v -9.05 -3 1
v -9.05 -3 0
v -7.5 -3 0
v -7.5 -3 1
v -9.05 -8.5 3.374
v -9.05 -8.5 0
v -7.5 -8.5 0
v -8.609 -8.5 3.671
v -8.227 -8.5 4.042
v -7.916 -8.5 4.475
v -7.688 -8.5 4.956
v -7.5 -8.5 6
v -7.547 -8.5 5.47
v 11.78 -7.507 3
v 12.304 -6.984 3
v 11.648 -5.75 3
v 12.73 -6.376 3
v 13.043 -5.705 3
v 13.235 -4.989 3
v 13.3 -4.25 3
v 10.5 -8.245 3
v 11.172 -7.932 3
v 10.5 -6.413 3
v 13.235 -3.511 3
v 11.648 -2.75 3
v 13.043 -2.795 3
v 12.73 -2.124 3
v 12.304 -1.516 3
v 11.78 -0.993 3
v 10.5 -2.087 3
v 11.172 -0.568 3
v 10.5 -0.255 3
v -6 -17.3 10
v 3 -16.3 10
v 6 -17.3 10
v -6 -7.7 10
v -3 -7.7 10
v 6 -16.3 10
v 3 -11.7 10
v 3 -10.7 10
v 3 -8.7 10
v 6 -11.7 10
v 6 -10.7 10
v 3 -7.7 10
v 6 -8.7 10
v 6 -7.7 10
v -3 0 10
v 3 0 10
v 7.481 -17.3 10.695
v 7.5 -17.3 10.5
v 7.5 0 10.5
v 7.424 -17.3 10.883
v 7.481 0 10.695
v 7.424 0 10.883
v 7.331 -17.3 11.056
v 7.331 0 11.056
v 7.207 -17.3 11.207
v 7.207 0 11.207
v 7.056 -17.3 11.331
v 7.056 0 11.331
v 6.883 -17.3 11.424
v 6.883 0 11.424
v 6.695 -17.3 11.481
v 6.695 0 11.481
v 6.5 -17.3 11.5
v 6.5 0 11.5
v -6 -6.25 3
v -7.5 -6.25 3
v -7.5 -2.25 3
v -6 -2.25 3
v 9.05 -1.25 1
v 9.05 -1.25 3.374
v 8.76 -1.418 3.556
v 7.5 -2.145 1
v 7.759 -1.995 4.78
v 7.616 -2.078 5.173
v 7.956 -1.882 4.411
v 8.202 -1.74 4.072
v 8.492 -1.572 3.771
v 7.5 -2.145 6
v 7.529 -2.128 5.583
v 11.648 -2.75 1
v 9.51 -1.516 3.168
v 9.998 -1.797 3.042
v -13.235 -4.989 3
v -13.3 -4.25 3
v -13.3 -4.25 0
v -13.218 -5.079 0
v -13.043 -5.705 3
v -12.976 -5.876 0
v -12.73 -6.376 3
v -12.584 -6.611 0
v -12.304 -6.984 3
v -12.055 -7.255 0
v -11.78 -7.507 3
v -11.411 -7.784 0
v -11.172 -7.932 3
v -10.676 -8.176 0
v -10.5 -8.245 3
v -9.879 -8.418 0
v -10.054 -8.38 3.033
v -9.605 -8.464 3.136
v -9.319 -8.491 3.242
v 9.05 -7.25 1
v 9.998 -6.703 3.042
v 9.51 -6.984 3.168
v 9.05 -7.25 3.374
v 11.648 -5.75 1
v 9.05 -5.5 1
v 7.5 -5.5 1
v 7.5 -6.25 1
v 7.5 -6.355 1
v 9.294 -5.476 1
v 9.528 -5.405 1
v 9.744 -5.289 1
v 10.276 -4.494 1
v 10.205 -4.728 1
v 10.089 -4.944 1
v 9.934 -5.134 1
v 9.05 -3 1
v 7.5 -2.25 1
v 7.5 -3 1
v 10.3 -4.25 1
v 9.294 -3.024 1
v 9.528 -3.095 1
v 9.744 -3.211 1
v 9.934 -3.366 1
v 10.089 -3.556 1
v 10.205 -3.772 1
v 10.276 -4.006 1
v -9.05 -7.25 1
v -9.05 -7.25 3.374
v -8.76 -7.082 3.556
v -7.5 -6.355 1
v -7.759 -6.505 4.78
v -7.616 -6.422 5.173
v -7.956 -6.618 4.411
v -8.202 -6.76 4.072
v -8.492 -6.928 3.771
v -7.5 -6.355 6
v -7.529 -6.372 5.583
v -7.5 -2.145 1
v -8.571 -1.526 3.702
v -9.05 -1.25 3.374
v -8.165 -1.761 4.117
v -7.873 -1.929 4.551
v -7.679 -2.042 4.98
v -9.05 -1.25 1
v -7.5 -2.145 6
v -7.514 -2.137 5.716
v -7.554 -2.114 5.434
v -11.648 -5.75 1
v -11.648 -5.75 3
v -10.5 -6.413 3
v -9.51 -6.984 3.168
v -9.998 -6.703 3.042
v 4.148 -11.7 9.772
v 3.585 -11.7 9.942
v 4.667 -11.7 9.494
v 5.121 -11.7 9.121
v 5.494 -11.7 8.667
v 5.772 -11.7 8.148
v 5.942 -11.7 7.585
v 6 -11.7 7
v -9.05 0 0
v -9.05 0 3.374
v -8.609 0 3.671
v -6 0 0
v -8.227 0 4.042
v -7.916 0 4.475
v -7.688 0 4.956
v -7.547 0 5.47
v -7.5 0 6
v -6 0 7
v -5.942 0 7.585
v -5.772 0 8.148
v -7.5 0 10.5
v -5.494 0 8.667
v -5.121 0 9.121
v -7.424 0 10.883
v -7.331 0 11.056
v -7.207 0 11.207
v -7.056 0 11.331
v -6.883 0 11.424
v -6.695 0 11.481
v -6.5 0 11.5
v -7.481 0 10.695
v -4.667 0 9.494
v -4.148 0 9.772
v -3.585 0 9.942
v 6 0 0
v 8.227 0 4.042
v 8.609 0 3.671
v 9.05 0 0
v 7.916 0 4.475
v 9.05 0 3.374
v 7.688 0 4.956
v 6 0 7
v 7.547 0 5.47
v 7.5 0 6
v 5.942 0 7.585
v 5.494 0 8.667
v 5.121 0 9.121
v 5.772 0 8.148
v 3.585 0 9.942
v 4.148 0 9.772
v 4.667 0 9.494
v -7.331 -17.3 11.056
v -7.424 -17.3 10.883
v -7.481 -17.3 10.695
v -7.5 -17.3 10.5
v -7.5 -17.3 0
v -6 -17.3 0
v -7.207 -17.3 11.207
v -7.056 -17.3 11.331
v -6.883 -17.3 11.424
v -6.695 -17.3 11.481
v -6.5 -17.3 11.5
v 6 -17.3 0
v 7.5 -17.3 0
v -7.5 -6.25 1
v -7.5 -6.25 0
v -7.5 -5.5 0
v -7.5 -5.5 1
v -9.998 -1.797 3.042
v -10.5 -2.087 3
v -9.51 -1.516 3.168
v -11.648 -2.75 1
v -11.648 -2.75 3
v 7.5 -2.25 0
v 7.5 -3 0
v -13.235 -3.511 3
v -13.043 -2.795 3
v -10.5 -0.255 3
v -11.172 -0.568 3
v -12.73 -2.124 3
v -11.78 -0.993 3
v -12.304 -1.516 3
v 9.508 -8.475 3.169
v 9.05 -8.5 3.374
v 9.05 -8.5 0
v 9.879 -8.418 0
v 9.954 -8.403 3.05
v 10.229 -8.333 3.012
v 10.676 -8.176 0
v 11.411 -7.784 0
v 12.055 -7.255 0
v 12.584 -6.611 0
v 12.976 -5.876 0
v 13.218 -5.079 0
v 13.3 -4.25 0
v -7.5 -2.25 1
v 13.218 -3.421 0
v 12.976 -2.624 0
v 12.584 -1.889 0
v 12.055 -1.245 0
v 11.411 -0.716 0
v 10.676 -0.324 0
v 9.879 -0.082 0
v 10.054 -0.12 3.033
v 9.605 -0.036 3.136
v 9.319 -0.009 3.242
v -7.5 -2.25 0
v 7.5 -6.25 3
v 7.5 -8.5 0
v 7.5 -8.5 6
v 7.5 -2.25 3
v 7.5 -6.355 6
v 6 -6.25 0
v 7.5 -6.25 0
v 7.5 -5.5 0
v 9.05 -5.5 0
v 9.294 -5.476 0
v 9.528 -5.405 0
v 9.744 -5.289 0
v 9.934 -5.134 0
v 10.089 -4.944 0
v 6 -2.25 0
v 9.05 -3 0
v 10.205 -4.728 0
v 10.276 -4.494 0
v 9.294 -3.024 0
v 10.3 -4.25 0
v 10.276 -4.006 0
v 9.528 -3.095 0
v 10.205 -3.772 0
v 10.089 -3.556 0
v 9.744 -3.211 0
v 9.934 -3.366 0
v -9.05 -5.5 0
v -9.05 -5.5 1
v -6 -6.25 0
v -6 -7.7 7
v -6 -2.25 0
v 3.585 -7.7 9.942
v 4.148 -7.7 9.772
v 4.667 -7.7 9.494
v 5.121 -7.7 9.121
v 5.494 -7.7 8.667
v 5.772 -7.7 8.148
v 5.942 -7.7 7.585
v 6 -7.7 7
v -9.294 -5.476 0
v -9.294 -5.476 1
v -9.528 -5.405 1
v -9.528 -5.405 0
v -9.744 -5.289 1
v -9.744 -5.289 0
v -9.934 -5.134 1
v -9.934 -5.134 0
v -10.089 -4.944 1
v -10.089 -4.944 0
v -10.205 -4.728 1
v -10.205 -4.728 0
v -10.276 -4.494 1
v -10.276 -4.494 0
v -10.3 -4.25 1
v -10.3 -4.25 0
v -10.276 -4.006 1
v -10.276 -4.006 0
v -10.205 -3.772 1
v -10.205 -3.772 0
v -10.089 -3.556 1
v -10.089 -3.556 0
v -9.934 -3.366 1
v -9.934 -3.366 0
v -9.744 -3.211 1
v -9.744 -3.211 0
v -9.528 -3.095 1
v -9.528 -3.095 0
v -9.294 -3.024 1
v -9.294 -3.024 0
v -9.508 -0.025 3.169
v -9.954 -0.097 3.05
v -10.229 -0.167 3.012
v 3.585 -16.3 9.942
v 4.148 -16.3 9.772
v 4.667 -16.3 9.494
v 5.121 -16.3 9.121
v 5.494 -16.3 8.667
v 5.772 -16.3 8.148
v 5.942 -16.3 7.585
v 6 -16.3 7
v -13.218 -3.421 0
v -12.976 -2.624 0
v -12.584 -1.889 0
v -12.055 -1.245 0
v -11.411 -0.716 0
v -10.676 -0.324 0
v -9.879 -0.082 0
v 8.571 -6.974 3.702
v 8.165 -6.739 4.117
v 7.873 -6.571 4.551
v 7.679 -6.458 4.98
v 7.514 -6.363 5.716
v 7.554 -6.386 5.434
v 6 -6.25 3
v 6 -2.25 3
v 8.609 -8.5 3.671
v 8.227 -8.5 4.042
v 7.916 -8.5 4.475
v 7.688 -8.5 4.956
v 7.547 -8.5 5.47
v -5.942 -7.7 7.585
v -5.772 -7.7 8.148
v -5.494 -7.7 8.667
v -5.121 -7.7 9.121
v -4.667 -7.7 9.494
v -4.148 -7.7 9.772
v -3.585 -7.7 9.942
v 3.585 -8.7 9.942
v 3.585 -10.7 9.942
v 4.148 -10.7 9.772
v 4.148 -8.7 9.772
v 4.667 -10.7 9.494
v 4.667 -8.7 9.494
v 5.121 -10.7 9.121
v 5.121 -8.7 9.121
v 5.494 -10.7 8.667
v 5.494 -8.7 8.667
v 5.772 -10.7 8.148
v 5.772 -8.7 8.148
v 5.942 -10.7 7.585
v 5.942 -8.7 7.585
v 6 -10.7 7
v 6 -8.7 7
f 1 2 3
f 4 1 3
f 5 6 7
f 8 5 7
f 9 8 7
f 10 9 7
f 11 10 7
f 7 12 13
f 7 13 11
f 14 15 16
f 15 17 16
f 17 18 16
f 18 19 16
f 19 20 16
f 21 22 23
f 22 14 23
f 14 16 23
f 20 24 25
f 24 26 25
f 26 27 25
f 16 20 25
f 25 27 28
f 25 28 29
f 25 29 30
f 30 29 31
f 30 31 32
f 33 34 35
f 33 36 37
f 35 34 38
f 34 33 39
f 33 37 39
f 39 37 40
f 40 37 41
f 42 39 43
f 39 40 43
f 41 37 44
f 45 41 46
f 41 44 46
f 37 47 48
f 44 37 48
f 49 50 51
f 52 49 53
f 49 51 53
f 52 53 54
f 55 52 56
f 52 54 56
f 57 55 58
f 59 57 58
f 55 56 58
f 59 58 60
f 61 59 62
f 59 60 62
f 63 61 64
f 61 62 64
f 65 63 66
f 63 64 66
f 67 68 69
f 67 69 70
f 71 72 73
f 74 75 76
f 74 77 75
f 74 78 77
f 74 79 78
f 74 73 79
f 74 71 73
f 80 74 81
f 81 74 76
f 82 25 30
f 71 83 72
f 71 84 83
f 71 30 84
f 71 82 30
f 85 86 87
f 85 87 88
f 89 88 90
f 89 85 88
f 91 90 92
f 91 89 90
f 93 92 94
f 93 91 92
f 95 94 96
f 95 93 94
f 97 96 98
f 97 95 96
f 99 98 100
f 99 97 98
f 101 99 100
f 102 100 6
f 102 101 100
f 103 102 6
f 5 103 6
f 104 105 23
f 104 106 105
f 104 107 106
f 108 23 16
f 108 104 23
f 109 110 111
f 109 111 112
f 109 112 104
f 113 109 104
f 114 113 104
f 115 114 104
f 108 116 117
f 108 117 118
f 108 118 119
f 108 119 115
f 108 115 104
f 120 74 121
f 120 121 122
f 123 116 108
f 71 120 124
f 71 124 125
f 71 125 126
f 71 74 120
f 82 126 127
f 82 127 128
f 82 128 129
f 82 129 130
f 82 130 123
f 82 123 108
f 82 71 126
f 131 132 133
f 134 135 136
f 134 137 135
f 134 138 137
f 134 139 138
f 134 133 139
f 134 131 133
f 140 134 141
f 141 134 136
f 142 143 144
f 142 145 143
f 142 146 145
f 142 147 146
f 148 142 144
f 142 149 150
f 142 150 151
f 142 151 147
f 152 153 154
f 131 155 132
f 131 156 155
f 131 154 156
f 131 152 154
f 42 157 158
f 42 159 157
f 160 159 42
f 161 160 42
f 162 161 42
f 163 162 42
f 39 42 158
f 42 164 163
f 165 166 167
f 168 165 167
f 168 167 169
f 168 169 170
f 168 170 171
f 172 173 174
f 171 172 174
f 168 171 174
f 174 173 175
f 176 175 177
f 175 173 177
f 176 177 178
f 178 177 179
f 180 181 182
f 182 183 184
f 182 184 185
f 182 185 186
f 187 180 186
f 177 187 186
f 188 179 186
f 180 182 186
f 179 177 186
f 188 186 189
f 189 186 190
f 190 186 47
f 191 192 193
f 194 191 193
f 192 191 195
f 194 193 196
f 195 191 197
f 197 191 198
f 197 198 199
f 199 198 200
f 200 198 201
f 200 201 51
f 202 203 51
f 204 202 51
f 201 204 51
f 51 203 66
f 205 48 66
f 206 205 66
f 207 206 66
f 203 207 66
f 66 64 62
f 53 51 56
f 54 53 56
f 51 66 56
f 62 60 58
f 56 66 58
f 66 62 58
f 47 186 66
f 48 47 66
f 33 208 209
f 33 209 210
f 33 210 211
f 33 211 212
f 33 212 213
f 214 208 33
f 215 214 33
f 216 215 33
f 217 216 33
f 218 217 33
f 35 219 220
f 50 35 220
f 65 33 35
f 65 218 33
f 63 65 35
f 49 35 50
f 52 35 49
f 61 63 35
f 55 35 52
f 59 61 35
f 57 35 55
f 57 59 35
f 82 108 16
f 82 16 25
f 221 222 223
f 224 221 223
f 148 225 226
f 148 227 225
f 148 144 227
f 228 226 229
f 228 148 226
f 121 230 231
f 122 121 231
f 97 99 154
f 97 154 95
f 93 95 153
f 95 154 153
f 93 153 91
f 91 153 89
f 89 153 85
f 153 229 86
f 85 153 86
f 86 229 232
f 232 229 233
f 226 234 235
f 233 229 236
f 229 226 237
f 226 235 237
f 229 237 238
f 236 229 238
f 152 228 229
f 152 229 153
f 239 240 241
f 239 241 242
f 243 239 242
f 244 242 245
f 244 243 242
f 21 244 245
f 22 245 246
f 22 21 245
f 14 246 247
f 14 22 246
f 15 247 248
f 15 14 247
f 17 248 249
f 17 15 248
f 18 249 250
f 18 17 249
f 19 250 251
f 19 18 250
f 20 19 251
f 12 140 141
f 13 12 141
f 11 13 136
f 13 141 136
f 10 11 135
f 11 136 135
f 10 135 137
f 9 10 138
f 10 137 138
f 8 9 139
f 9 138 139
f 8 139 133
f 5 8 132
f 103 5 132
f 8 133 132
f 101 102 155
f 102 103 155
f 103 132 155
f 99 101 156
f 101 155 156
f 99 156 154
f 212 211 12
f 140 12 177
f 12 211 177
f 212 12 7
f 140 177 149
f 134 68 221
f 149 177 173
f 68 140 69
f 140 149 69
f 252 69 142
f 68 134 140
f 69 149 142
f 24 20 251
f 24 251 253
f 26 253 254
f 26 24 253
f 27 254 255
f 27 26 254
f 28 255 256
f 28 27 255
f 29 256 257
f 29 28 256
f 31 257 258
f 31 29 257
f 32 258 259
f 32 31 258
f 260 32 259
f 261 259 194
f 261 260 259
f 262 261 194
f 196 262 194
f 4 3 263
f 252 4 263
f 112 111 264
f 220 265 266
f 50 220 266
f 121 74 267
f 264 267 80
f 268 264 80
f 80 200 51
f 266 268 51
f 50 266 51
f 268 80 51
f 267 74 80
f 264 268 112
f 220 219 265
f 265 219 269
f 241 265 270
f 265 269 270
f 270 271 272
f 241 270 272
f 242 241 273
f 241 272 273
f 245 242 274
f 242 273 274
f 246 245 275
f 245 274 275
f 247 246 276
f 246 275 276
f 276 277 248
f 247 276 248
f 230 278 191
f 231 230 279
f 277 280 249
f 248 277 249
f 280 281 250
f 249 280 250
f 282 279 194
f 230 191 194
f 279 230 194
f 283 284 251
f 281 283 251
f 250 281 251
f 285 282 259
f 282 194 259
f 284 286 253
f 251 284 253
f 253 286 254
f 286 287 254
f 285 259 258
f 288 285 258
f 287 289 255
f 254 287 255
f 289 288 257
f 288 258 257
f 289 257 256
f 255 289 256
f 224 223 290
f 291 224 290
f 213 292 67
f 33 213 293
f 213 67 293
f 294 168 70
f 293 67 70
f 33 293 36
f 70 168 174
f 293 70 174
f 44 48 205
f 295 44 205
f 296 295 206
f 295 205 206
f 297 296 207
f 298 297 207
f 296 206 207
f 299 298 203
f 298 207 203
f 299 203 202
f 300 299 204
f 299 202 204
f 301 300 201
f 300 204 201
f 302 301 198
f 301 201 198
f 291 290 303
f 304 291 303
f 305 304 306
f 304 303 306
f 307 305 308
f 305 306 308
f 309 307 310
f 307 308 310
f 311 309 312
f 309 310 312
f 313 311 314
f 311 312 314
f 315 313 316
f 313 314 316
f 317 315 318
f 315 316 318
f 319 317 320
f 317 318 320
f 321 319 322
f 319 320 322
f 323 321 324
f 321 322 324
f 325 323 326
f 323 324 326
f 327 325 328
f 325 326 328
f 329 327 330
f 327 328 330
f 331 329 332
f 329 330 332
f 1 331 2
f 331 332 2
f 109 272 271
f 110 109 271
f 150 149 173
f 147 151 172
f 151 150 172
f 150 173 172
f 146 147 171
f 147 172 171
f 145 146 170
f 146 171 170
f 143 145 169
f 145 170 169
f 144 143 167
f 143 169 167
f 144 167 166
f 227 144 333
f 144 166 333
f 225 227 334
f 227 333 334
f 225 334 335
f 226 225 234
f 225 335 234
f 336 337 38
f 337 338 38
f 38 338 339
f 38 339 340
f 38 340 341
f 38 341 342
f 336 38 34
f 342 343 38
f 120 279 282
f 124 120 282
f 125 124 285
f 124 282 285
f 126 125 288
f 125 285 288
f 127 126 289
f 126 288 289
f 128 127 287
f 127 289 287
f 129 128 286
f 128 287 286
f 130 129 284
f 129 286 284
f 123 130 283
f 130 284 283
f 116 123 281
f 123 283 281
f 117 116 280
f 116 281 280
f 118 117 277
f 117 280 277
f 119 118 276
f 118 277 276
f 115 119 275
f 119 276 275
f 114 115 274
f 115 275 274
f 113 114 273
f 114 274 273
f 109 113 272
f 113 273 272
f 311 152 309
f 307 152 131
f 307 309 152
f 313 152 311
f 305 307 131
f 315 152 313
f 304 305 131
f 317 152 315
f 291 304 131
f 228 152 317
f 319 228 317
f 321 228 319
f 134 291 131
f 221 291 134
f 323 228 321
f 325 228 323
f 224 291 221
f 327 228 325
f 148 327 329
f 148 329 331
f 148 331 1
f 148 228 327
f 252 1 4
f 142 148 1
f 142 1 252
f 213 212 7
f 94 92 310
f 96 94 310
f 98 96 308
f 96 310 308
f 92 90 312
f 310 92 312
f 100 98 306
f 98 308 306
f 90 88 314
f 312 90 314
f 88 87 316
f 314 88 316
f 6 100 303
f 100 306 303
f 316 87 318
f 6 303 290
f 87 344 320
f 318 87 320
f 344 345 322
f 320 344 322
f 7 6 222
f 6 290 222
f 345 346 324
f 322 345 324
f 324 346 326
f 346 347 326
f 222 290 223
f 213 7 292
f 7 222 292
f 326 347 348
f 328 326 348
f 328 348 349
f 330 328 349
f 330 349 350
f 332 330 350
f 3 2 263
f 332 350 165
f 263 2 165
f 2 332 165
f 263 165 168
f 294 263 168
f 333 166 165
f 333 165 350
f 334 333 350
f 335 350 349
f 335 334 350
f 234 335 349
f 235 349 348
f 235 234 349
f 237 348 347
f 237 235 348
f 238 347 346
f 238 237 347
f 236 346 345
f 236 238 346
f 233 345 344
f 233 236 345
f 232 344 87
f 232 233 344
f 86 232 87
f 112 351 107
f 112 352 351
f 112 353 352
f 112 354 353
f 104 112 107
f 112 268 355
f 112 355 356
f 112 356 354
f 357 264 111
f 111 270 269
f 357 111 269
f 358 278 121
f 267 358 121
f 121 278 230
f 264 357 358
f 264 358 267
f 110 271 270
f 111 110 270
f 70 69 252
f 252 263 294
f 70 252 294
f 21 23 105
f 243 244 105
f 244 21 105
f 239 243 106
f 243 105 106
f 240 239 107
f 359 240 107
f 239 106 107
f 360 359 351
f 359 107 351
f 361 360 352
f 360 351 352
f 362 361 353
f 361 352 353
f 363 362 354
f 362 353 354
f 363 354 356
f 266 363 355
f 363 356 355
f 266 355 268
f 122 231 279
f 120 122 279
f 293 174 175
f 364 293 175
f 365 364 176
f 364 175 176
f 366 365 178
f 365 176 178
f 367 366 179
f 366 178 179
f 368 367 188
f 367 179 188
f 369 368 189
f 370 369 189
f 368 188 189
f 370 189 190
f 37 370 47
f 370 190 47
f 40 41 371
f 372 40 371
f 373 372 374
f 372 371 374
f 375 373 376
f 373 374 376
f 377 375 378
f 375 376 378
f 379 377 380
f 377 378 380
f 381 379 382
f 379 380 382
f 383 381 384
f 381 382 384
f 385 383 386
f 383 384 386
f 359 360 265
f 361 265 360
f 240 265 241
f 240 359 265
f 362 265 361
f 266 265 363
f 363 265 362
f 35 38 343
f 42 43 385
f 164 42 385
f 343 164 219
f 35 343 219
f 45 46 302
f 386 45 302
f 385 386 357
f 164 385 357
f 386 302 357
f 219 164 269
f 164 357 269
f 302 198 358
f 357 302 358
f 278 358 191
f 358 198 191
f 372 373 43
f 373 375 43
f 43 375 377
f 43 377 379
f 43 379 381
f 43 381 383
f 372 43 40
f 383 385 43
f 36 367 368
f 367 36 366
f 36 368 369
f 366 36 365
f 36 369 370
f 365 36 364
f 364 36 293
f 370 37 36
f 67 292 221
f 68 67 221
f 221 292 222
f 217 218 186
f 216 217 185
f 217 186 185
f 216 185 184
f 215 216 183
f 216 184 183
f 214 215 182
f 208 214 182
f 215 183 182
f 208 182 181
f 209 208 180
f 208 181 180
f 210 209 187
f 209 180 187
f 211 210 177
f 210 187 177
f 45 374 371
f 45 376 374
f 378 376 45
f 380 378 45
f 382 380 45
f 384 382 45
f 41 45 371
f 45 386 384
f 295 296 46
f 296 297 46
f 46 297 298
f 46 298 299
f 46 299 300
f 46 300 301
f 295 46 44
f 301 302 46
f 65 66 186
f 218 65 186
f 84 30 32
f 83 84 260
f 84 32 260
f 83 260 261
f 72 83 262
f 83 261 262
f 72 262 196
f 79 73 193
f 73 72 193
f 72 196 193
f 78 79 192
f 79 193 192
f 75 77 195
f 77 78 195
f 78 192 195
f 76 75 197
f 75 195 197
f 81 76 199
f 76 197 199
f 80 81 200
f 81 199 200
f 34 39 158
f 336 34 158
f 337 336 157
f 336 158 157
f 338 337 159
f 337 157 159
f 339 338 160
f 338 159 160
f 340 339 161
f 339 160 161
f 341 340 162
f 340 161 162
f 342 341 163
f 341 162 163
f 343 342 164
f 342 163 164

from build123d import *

# Parameters (mm, degrees)
F1_DEPTH  = 17.3
F3_DEPTH  = 11.501
F5_DEPTH  = 3
F8_DEPTH  = 10.501
F9_W      = 3
F9_H      = 9.6
F9_H_2    = 1
F10_DEPTH = 10


with BuildPart() as f1:
    # F0 (on Front) → F1 (new body)
    with BuildSketch(Plane.XZ):
        with BuildLine():
            Line((6.5, 11.5), (0, 11.5))
            Line((0, 11.5), (-6.5, 11.5))
            ThreePointArc((-6.5, 11.5), (-7.207107, 11.207107), (-7.5, 10.5))
            Line((-7.5, 10.5), (-7.5, 6))
            ThreePointArc((-7.5, 6), (-8.37868, 3.87868), (-10.5, 3))
            Line((-10.5, 3), (-13.3, 3))
            Line((-13.3, 3), (-13.3, 0))
            Line((-13.3, 0), (-6, 0))
            Line((-6, 0), (-6, 7))
            ThreePointArc((-6, 7), (-5.12132, 9.12132), (-3, 10))
            Line((-3, 10), (0, 10))
            Line((0, 10), (3, 10))
            ThreePointArc((3, 10), (5.12132, 9.12132), (6, 7))
            Line((6, 7), (6, 0))
            Line((6, 0), (13.3, 0))
            Line((13.3, 0), (13.3, 3))
            Line((13.3, 3), (10.5, 3))
            ThreePointArc((10.5, 3), (8.37868, 3.87868), (7.5, 6))
            Line((7.5, 6), (7.5, 10.5))
            ThreePointArc((7.5, 10.5), (7.207107, 11.207107), (6.5, 11.5))
        make_face()
    extrude(amount=F1_DEPTH)

    # F2 (on face) → F3 (intersect, through all)
    with BuildSketch(Plane.XY.offset(11.5)):
        with BuildLine():
            Line((6.5, 0), (-6.5, 0))
            Line((-6.5, 0), (-7.5, 0))
            Line((-7.5, 0), (-9.05, 0))
            ThreePointArc((-9.05, 0), (-12.055204, -1.244796), (-13.3, -4.25))
            ThreePointArc((-13.3, -4.25), (-12.055204, -7.255204), (-9.05, -8.5))
            Line((-9.05, -8.5), (-7.5, -8.5))
            Line((-7.5, -8.5), (-7.5, -17.3))
            Line((-7.5, -17.3), (-6.5, -17.3))
            Line((-6.5, -17.3), (6.5, -17.3))
            Line((6.5, -17.3), (7.5, -17.3))
            Line((7.5, -17.3), (7.5, -8.5))
            Line((7.5, -8.5), (9.05, -8.5))
            ThreePointArc((9.05, -8.5), (12.055204, -7.255204), (13.3, -4.25))
            ThreePointArc((13.3, -4.25), (12.055204, -1.244796), (9.05, 0))
            Line((9.05, 0), (7.5, 0))
            Line((7.5, 0), (6.5, 0))
        make_face()
    extrude(amount=-F3_DEPTH, mode=Mode.INTERSECT)

    # F4 (on face) → F5 (cut)
    with BuildSketch(Plane(origin=(0, 0, 0), x_dir=(1, 0, 0), z_dir=(0, 0, -1))):
        with BuildLine():
            Line((-7.5, 6.25), (-7.5, 5.5))
            Line((-7.5, 5.5), (-9.05, 5.5))
            ThreePointArc((-9.05, 5.5), (-10.3, 4.25), (-9.05, 3))
            Line((-9.05, 3), (-7.5, 3))
            Line((-7.5, 3), (-7.5, 2.25))
            Line((-7.5, 2.25), (-6, 2.25))
            Line((-6, 2.25), (-6, 6.25))
            Line((-6, 6.25), (-7.5, 6.25))
        make_face()
        with BuildLine():
            Line((7.5, 6.25), (6, 6.25))
            Line((6, 6.25), (6, 2.25))
            Line((6, 2.25), (7.5, 2.25))
            Line((7.5, 2.25), (7.5, 3))
            Line((7.5, 3), (9.05, 3))
            ThreePointArc((9.05, 3), (10.3, 4.25), (9.05, 5.5))
            Line((9.05, 5.5), (7.5, 5.5))
            Line((7.5, 5.5), (7.5, 6.25))
        make_face()
    extrude(amount=-F5_DEPTH, mode=Mode.SUBTRACT)

    # F7 (on offset) → F8 (cut, through all)
    with BuildSketch(Plane.XY.offset(1)):
        Polygon((-11.648076, -2.75), (-11.648076, -5.75), (-9.05, -7.25), (-7.5, -6.355107), (-7.5, -2.144893), (-9.05, -1.25), align=None)
        Polygon((7.5, -2.144893), (7.5, -6.355107), (9.05, -7.25), (11.648076, -5.75), (11.648076, -2.75), (9.05, -1.25), align=None)
    extrude(amount=F8_DEPTH, mode=Mode.SUBTRACT)

    # F9 (on face) → F10 (cut, through all)
    with BuildSketch(Plane(origin=(0, 0, 0), x_dir=(1, 0, 0), z_dir=(0, 0, -1))):
        with Locations((-4.5, 12.5)):
            Rectangle(F9_W, F9_H)
        with Locations((4.5, 16.8)):
            Rectangle(F9_W, F9_H_2)
        with Locations((4.5, 8.2)):
            Rectangle(F9_W, F9_H_2)
        with Locations((4.5, 11.2)):
            Rectangle(F9_W, F9_H_2)
    extrude(amount=-F10_DEPTH, mode=Mode.SUBTRACT)


solid = f1.part
